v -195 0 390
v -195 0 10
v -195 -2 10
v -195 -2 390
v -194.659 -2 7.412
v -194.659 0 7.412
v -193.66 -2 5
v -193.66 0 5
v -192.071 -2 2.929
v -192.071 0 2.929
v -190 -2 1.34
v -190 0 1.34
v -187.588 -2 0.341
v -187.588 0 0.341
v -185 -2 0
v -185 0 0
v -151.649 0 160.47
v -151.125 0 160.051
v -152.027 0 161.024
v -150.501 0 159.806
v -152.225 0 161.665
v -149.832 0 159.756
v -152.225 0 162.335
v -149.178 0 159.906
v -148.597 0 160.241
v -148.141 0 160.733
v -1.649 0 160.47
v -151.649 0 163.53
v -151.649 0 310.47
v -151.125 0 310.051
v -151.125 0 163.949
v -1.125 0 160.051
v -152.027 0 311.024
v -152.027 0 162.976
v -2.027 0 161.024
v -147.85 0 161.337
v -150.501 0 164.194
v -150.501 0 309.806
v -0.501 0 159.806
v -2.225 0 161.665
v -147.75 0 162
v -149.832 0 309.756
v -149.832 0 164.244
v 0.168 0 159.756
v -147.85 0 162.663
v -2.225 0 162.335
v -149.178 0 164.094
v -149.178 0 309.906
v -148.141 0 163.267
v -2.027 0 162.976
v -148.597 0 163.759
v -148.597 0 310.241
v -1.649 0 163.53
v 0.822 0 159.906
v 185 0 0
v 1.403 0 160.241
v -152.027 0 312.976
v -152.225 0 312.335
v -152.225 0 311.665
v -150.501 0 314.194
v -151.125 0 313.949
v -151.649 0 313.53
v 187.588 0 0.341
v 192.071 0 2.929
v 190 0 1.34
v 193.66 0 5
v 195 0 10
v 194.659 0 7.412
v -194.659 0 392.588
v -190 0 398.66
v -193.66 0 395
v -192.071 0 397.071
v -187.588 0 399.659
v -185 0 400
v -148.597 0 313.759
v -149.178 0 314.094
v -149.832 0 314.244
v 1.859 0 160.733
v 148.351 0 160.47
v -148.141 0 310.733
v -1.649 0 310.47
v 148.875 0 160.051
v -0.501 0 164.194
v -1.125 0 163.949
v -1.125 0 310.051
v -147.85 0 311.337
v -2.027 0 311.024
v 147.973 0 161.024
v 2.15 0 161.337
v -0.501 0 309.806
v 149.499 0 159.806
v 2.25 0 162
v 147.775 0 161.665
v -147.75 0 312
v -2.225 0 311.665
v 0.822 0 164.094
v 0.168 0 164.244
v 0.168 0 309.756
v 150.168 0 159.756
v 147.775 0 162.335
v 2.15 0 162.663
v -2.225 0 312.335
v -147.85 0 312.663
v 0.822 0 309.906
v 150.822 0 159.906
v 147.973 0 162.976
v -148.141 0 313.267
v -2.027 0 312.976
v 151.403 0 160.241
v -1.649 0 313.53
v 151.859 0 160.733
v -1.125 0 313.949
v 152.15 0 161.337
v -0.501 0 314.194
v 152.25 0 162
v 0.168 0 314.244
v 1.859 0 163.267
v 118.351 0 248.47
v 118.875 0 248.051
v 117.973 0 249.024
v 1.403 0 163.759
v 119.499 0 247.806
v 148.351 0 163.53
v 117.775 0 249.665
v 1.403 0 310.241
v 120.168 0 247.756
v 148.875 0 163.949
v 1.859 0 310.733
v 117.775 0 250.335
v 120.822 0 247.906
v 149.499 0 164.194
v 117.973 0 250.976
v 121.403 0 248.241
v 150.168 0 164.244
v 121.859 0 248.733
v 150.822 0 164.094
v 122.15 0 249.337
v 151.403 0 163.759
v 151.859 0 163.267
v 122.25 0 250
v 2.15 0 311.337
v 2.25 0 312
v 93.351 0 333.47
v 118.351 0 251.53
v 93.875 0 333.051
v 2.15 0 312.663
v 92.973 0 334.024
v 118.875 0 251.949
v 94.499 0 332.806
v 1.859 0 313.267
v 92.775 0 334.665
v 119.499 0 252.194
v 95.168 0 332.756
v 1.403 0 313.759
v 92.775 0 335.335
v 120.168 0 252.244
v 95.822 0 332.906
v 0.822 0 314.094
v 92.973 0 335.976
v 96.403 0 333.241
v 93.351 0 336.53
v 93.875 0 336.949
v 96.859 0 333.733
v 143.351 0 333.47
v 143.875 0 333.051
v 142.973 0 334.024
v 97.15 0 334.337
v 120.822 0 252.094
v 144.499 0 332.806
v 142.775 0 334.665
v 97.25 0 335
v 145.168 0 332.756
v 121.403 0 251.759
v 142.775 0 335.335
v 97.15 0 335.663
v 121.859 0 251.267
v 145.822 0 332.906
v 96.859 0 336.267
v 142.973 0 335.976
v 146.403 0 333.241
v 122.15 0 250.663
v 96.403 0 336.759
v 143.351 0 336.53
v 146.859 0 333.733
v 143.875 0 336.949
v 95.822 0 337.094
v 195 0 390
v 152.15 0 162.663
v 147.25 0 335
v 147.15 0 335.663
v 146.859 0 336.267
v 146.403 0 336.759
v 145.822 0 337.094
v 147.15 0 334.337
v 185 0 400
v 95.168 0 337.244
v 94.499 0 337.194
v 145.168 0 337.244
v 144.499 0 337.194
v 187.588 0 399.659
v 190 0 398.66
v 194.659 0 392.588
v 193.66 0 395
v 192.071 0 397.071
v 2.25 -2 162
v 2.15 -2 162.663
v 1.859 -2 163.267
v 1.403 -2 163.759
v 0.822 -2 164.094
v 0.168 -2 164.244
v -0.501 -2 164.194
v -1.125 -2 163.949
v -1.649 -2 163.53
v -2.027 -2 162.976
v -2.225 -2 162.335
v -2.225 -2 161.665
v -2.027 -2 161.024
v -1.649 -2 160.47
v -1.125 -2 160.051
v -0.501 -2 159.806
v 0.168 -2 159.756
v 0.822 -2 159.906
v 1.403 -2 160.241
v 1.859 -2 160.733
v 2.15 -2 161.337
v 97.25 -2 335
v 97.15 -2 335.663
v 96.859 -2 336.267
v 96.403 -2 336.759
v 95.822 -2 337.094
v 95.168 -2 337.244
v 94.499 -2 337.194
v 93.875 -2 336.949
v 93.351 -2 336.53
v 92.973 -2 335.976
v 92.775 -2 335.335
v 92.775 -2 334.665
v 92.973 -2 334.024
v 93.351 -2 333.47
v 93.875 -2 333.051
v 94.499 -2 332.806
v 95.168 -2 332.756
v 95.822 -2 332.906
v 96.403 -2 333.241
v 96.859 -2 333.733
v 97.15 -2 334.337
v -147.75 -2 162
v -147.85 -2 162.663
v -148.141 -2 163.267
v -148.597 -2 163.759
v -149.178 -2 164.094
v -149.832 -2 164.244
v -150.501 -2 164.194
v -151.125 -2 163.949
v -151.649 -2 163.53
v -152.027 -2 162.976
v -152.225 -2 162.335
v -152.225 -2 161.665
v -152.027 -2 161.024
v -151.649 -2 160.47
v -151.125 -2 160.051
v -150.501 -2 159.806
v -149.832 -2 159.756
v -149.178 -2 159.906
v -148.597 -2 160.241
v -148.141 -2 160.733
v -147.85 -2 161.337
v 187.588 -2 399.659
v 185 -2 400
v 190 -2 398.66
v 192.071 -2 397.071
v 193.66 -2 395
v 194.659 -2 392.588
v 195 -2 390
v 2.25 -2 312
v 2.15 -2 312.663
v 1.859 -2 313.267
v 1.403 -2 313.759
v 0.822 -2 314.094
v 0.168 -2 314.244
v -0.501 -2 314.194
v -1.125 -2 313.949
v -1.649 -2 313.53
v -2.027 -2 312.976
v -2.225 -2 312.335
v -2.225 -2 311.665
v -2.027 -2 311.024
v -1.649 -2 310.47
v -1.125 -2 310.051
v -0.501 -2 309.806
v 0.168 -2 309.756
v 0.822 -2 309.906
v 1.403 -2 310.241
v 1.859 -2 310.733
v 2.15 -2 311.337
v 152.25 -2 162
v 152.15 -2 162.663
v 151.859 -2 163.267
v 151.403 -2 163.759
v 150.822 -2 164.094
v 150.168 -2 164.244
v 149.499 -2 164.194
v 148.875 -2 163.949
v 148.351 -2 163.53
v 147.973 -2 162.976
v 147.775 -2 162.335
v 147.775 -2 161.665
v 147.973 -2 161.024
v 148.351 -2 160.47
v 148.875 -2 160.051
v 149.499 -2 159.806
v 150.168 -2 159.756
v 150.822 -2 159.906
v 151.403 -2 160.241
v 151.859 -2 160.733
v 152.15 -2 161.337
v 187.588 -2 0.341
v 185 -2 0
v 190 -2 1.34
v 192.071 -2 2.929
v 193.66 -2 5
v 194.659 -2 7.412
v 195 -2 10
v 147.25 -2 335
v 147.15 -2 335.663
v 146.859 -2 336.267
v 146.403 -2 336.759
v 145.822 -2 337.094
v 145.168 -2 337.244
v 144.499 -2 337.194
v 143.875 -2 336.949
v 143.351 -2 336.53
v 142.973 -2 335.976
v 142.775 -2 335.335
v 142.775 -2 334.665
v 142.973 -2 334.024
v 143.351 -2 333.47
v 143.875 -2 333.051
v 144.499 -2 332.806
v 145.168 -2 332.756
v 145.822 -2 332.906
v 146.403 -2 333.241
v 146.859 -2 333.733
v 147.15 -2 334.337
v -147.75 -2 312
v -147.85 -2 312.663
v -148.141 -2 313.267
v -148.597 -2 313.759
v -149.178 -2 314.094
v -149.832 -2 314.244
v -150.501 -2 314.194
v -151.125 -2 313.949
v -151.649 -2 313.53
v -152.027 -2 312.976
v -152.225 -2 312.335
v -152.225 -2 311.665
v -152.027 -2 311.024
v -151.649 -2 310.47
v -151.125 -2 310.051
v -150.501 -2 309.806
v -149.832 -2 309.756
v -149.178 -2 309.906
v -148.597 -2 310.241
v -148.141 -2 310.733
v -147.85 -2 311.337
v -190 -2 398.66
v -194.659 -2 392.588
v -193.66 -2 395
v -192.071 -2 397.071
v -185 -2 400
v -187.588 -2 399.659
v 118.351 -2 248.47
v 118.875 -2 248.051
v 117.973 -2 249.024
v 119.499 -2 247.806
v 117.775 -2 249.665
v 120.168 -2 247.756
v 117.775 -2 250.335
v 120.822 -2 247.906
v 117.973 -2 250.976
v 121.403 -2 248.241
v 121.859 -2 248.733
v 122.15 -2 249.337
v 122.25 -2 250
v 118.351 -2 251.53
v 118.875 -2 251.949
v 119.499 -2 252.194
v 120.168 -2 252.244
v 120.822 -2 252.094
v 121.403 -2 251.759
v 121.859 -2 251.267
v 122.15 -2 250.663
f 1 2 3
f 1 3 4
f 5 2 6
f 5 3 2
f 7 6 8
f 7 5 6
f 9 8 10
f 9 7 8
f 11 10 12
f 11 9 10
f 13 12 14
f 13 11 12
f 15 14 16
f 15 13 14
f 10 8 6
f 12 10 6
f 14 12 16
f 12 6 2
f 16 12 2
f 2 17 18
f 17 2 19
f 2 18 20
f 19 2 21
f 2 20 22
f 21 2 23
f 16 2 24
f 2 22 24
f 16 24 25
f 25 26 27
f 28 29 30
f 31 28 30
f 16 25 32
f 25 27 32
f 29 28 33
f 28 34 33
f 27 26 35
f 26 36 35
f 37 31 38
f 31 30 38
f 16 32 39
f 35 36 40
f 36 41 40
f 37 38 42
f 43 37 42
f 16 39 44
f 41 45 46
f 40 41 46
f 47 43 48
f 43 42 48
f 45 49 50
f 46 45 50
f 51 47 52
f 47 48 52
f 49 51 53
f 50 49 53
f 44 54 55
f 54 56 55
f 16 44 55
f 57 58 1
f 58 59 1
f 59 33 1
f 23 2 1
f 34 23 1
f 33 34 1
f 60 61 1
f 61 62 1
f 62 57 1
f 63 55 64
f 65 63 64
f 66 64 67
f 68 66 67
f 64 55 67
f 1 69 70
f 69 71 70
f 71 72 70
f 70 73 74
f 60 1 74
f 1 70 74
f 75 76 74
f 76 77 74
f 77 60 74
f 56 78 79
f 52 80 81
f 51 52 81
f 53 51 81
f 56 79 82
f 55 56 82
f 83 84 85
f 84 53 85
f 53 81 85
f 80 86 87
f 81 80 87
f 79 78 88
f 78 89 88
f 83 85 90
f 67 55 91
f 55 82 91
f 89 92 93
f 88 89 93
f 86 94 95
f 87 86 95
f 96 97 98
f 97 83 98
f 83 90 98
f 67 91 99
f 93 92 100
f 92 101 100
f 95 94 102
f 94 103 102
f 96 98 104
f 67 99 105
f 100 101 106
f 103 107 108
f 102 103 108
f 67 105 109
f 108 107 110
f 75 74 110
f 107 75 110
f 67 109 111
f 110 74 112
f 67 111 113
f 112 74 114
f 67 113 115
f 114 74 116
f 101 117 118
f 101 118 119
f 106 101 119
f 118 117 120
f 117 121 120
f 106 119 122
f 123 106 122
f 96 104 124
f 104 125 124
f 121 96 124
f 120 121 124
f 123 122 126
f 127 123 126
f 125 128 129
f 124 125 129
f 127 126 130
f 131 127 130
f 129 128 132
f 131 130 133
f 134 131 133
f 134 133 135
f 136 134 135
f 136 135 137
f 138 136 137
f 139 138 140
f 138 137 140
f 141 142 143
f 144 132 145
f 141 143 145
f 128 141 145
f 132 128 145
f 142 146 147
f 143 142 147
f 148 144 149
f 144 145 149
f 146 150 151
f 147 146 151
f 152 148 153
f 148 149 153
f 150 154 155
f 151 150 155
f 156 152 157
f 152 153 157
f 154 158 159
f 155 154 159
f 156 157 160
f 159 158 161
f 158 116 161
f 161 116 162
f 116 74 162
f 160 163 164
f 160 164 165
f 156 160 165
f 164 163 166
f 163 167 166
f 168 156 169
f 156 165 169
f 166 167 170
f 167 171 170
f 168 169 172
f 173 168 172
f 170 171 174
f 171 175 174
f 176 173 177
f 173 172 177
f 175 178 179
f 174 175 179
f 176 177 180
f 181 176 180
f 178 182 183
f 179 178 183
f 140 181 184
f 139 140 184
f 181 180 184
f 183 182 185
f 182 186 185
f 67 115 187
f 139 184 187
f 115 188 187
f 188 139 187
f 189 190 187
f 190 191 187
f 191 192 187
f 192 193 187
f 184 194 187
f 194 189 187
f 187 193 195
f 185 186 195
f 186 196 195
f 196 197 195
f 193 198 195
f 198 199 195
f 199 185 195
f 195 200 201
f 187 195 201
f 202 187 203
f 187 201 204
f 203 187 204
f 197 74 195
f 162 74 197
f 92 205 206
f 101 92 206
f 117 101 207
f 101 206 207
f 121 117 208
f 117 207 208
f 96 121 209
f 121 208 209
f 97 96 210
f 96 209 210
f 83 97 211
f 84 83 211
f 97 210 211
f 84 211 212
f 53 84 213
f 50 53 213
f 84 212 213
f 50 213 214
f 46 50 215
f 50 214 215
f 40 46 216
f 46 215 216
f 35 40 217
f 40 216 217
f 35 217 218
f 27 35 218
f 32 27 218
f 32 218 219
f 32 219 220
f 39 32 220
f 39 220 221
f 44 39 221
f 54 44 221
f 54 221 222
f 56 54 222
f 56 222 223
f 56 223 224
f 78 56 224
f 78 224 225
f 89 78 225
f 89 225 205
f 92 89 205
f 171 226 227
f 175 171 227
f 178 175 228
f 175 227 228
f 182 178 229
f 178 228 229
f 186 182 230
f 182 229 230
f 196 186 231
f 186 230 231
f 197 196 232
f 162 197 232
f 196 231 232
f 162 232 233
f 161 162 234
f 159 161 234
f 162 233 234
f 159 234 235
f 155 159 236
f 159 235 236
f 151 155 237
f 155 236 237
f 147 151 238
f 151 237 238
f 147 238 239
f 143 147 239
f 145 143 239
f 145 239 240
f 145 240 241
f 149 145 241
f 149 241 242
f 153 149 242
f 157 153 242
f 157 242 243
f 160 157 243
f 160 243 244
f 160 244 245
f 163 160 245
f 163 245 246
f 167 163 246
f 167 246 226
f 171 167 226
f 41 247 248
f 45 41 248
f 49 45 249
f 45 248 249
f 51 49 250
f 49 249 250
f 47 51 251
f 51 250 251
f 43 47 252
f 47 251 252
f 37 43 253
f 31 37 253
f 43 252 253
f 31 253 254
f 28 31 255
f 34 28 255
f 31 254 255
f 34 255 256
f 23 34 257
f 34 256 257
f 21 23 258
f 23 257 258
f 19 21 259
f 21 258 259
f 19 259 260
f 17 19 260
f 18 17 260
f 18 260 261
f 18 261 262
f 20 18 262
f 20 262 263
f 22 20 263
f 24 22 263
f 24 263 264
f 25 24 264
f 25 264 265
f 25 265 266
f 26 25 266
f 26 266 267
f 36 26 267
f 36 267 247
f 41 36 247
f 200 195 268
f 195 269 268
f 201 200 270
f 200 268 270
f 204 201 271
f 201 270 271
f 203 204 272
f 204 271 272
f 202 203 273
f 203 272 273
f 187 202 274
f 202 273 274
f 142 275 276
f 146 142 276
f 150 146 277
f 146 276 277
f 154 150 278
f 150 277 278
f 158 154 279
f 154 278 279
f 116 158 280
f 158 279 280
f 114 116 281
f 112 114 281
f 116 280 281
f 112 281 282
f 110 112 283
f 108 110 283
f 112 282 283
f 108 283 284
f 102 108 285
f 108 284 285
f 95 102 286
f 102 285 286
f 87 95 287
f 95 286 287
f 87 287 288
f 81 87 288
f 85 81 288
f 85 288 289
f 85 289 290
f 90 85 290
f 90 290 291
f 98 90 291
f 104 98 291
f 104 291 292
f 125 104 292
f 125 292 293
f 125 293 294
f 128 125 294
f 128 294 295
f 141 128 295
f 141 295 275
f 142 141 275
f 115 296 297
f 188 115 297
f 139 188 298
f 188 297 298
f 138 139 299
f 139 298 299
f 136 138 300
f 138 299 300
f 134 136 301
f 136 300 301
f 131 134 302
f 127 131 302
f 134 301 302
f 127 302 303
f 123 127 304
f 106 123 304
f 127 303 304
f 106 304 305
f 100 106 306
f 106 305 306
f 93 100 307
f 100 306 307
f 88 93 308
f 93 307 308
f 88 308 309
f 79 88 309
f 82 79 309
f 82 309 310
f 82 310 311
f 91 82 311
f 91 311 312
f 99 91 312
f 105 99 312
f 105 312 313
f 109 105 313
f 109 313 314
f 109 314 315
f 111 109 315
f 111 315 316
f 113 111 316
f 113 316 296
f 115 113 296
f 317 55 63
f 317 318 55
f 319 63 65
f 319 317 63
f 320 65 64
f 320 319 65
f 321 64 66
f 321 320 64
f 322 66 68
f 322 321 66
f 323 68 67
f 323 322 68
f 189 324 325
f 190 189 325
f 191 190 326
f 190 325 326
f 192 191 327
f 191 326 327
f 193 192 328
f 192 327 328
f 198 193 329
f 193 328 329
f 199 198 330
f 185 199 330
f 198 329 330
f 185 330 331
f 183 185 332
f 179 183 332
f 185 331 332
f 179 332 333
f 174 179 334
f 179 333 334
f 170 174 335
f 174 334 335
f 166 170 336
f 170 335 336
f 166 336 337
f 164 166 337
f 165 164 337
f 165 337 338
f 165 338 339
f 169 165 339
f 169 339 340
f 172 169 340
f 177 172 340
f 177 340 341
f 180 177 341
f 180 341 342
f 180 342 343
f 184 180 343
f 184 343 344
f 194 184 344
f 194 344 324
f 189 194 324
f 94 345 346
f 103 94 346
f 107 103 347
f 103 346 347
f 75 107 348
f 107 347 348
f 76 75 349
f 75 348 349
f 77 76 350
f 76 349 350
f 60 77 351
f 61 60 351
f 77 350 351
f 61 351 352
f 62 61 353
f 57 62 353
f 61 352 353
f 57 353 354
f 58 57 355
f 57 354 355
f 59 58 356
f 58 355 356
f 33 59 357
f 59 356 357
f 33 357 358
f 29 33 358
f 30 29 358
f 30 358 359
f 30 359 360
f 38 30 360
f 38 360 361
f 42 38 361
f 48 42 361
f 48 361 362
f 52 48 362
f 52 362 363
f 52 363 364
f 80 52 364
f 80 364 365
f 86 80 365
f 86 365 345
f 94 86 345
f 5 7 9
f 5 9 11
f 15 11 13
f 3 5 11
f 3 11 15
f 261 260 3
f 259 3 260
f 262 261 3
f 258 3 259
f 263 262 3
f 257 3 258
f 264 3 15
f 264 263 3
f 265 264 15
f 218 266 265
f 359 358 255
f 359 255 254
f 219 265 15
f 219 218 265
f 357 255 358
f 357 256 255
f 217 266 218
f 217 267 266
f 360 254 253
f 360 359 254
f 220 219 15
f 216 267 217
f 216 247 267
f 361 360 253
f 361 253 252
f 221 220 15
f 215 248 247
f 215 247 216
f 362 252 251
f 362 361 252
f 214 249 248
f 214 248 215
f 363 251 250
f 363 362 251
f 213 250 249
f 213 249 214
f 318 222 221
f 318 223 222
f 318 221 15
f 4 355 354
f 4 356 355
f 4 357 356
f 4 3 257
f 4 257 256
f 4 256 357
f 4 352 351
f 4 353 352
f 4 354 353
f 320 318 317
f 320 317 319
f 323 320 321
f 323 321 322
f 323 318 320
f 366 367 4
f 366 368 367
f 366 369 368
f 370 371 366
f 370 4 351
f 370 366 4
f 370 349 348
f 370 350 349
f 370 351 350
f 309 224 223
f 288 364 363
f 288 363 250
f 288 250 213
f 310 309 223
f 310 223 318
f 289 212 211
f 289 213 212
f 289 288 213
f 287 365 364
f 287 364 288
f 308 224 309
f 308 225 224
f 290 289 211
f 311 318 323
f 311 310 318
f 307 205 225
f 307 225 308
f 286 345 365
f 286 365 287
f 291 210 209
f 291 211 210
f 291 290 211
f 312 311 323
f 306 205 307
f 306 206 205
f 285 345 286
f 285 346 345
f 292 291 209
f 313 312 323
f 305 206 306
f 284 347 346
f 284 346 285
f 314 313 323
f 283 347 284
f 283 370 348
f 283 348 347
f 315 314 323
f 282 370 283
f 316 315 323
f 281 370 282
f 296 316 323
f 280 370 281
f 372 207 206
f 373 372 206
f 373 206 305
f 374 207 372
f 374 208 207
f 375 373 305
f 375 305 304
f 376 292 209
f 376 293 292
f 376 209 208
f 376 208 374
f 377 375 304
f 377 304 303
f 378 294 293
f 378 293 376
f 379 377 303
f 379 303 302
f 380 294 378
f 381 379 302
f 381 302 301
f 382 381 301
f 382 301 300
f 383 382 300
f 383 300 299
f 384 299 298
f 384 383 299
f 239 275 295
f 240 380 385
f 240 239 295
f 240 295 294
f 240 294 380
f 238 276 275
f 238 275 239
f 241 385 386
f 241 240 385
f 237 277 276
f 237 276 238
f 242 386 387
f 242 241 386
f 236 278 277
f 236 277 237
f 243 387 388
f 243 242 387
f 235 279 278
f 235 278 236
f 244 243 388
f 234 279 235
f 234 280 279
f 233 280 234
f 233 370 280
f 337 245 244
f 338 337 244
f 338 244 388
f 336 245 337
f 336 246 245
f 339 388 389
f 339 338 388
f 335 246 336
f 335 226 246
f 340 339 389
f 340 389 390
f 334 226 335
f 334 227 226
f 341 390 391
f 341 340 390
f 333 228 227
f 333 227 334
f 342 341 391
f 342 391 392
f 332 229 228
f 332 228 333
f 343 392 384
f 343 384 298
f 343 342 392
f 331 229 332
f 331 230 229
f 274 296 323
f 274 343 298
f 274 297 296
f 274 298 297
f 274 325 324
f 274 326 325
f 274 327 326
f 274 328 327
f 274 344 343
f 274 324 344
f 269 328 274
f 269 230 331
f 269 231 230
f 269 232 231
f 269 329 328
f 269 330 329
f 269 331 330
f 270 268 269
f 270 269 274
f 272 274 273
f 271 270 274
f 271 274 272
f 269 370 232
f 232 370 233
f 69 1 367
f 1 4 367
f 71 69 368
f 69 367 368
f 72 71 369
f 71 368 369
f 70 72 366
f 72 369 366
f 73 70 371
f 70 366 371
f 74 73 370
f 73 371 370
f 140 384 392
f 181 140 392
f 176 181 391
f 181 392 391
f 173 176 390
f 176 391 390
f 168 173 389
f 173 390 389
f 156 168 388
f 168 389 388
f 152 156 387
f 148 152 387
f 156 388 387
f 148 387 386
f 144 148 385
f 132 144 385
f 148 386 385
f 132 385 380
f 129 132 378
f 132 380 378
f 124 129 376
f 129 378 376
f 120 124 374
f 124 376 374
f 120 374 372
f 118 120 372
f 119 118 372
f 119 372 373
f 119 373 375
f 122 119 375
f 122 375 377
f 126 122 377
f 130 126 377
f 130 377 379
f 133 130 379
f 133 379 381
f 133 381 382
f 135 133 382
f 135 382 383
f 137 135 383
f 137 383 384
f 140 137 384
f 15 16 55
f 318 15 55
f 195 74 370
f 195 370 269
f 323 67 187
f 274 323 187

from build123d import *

# Parameters (mm, degrees)
F0_W     = 390
F0_H     = 400
F1_DEPTH = 2
F2_R     = 2.25
F3_DEPTH = 25
F4_R     = 10


with BuildPart() as f1:
    # F0 (on Front) → F1 (new body)
    with BuildSketch(Plane.XZ):
        with Locations((0, 200)):
            Rectangle(F0_W, F0_H)
    extrude(amount=F1_DEPTH)

    # F2 (on face) → F3 (cut)
    with BuildSketch(Plane.XZ.offset(2)):
        with Locations((145, 335)):
            Circle(F2_R)
        with Locations((95, 335)):
            Circle(F2_R)
        with Locations((120, 250)):
            Circle(F2_R)
        with Locations((0, 162)):
            Circle(F2_R)
        with Locations((-150, 162)):
            Circle(F2_R)
        with Locations((150, 162)):
            Circle(F2_R)
        with Locations((-150, 312)):
            Circle(F2_R)
        with Locations((0, 312)):
            Circle(F2_R)
    extrude(amount=-F3_DEPTH, mode=Mode.SUBTRACT)

    # F4
    f4_edges = [f1.edges().sort_by_distance(p)[0] for p in [
        (195, -1, 400),
        (-195, -1, 400),
        (195, -1, 0),
        (-195, -1, 0),
    ]]
    fillet(f4_edges, radius=F4_R)


solid = f1.part
